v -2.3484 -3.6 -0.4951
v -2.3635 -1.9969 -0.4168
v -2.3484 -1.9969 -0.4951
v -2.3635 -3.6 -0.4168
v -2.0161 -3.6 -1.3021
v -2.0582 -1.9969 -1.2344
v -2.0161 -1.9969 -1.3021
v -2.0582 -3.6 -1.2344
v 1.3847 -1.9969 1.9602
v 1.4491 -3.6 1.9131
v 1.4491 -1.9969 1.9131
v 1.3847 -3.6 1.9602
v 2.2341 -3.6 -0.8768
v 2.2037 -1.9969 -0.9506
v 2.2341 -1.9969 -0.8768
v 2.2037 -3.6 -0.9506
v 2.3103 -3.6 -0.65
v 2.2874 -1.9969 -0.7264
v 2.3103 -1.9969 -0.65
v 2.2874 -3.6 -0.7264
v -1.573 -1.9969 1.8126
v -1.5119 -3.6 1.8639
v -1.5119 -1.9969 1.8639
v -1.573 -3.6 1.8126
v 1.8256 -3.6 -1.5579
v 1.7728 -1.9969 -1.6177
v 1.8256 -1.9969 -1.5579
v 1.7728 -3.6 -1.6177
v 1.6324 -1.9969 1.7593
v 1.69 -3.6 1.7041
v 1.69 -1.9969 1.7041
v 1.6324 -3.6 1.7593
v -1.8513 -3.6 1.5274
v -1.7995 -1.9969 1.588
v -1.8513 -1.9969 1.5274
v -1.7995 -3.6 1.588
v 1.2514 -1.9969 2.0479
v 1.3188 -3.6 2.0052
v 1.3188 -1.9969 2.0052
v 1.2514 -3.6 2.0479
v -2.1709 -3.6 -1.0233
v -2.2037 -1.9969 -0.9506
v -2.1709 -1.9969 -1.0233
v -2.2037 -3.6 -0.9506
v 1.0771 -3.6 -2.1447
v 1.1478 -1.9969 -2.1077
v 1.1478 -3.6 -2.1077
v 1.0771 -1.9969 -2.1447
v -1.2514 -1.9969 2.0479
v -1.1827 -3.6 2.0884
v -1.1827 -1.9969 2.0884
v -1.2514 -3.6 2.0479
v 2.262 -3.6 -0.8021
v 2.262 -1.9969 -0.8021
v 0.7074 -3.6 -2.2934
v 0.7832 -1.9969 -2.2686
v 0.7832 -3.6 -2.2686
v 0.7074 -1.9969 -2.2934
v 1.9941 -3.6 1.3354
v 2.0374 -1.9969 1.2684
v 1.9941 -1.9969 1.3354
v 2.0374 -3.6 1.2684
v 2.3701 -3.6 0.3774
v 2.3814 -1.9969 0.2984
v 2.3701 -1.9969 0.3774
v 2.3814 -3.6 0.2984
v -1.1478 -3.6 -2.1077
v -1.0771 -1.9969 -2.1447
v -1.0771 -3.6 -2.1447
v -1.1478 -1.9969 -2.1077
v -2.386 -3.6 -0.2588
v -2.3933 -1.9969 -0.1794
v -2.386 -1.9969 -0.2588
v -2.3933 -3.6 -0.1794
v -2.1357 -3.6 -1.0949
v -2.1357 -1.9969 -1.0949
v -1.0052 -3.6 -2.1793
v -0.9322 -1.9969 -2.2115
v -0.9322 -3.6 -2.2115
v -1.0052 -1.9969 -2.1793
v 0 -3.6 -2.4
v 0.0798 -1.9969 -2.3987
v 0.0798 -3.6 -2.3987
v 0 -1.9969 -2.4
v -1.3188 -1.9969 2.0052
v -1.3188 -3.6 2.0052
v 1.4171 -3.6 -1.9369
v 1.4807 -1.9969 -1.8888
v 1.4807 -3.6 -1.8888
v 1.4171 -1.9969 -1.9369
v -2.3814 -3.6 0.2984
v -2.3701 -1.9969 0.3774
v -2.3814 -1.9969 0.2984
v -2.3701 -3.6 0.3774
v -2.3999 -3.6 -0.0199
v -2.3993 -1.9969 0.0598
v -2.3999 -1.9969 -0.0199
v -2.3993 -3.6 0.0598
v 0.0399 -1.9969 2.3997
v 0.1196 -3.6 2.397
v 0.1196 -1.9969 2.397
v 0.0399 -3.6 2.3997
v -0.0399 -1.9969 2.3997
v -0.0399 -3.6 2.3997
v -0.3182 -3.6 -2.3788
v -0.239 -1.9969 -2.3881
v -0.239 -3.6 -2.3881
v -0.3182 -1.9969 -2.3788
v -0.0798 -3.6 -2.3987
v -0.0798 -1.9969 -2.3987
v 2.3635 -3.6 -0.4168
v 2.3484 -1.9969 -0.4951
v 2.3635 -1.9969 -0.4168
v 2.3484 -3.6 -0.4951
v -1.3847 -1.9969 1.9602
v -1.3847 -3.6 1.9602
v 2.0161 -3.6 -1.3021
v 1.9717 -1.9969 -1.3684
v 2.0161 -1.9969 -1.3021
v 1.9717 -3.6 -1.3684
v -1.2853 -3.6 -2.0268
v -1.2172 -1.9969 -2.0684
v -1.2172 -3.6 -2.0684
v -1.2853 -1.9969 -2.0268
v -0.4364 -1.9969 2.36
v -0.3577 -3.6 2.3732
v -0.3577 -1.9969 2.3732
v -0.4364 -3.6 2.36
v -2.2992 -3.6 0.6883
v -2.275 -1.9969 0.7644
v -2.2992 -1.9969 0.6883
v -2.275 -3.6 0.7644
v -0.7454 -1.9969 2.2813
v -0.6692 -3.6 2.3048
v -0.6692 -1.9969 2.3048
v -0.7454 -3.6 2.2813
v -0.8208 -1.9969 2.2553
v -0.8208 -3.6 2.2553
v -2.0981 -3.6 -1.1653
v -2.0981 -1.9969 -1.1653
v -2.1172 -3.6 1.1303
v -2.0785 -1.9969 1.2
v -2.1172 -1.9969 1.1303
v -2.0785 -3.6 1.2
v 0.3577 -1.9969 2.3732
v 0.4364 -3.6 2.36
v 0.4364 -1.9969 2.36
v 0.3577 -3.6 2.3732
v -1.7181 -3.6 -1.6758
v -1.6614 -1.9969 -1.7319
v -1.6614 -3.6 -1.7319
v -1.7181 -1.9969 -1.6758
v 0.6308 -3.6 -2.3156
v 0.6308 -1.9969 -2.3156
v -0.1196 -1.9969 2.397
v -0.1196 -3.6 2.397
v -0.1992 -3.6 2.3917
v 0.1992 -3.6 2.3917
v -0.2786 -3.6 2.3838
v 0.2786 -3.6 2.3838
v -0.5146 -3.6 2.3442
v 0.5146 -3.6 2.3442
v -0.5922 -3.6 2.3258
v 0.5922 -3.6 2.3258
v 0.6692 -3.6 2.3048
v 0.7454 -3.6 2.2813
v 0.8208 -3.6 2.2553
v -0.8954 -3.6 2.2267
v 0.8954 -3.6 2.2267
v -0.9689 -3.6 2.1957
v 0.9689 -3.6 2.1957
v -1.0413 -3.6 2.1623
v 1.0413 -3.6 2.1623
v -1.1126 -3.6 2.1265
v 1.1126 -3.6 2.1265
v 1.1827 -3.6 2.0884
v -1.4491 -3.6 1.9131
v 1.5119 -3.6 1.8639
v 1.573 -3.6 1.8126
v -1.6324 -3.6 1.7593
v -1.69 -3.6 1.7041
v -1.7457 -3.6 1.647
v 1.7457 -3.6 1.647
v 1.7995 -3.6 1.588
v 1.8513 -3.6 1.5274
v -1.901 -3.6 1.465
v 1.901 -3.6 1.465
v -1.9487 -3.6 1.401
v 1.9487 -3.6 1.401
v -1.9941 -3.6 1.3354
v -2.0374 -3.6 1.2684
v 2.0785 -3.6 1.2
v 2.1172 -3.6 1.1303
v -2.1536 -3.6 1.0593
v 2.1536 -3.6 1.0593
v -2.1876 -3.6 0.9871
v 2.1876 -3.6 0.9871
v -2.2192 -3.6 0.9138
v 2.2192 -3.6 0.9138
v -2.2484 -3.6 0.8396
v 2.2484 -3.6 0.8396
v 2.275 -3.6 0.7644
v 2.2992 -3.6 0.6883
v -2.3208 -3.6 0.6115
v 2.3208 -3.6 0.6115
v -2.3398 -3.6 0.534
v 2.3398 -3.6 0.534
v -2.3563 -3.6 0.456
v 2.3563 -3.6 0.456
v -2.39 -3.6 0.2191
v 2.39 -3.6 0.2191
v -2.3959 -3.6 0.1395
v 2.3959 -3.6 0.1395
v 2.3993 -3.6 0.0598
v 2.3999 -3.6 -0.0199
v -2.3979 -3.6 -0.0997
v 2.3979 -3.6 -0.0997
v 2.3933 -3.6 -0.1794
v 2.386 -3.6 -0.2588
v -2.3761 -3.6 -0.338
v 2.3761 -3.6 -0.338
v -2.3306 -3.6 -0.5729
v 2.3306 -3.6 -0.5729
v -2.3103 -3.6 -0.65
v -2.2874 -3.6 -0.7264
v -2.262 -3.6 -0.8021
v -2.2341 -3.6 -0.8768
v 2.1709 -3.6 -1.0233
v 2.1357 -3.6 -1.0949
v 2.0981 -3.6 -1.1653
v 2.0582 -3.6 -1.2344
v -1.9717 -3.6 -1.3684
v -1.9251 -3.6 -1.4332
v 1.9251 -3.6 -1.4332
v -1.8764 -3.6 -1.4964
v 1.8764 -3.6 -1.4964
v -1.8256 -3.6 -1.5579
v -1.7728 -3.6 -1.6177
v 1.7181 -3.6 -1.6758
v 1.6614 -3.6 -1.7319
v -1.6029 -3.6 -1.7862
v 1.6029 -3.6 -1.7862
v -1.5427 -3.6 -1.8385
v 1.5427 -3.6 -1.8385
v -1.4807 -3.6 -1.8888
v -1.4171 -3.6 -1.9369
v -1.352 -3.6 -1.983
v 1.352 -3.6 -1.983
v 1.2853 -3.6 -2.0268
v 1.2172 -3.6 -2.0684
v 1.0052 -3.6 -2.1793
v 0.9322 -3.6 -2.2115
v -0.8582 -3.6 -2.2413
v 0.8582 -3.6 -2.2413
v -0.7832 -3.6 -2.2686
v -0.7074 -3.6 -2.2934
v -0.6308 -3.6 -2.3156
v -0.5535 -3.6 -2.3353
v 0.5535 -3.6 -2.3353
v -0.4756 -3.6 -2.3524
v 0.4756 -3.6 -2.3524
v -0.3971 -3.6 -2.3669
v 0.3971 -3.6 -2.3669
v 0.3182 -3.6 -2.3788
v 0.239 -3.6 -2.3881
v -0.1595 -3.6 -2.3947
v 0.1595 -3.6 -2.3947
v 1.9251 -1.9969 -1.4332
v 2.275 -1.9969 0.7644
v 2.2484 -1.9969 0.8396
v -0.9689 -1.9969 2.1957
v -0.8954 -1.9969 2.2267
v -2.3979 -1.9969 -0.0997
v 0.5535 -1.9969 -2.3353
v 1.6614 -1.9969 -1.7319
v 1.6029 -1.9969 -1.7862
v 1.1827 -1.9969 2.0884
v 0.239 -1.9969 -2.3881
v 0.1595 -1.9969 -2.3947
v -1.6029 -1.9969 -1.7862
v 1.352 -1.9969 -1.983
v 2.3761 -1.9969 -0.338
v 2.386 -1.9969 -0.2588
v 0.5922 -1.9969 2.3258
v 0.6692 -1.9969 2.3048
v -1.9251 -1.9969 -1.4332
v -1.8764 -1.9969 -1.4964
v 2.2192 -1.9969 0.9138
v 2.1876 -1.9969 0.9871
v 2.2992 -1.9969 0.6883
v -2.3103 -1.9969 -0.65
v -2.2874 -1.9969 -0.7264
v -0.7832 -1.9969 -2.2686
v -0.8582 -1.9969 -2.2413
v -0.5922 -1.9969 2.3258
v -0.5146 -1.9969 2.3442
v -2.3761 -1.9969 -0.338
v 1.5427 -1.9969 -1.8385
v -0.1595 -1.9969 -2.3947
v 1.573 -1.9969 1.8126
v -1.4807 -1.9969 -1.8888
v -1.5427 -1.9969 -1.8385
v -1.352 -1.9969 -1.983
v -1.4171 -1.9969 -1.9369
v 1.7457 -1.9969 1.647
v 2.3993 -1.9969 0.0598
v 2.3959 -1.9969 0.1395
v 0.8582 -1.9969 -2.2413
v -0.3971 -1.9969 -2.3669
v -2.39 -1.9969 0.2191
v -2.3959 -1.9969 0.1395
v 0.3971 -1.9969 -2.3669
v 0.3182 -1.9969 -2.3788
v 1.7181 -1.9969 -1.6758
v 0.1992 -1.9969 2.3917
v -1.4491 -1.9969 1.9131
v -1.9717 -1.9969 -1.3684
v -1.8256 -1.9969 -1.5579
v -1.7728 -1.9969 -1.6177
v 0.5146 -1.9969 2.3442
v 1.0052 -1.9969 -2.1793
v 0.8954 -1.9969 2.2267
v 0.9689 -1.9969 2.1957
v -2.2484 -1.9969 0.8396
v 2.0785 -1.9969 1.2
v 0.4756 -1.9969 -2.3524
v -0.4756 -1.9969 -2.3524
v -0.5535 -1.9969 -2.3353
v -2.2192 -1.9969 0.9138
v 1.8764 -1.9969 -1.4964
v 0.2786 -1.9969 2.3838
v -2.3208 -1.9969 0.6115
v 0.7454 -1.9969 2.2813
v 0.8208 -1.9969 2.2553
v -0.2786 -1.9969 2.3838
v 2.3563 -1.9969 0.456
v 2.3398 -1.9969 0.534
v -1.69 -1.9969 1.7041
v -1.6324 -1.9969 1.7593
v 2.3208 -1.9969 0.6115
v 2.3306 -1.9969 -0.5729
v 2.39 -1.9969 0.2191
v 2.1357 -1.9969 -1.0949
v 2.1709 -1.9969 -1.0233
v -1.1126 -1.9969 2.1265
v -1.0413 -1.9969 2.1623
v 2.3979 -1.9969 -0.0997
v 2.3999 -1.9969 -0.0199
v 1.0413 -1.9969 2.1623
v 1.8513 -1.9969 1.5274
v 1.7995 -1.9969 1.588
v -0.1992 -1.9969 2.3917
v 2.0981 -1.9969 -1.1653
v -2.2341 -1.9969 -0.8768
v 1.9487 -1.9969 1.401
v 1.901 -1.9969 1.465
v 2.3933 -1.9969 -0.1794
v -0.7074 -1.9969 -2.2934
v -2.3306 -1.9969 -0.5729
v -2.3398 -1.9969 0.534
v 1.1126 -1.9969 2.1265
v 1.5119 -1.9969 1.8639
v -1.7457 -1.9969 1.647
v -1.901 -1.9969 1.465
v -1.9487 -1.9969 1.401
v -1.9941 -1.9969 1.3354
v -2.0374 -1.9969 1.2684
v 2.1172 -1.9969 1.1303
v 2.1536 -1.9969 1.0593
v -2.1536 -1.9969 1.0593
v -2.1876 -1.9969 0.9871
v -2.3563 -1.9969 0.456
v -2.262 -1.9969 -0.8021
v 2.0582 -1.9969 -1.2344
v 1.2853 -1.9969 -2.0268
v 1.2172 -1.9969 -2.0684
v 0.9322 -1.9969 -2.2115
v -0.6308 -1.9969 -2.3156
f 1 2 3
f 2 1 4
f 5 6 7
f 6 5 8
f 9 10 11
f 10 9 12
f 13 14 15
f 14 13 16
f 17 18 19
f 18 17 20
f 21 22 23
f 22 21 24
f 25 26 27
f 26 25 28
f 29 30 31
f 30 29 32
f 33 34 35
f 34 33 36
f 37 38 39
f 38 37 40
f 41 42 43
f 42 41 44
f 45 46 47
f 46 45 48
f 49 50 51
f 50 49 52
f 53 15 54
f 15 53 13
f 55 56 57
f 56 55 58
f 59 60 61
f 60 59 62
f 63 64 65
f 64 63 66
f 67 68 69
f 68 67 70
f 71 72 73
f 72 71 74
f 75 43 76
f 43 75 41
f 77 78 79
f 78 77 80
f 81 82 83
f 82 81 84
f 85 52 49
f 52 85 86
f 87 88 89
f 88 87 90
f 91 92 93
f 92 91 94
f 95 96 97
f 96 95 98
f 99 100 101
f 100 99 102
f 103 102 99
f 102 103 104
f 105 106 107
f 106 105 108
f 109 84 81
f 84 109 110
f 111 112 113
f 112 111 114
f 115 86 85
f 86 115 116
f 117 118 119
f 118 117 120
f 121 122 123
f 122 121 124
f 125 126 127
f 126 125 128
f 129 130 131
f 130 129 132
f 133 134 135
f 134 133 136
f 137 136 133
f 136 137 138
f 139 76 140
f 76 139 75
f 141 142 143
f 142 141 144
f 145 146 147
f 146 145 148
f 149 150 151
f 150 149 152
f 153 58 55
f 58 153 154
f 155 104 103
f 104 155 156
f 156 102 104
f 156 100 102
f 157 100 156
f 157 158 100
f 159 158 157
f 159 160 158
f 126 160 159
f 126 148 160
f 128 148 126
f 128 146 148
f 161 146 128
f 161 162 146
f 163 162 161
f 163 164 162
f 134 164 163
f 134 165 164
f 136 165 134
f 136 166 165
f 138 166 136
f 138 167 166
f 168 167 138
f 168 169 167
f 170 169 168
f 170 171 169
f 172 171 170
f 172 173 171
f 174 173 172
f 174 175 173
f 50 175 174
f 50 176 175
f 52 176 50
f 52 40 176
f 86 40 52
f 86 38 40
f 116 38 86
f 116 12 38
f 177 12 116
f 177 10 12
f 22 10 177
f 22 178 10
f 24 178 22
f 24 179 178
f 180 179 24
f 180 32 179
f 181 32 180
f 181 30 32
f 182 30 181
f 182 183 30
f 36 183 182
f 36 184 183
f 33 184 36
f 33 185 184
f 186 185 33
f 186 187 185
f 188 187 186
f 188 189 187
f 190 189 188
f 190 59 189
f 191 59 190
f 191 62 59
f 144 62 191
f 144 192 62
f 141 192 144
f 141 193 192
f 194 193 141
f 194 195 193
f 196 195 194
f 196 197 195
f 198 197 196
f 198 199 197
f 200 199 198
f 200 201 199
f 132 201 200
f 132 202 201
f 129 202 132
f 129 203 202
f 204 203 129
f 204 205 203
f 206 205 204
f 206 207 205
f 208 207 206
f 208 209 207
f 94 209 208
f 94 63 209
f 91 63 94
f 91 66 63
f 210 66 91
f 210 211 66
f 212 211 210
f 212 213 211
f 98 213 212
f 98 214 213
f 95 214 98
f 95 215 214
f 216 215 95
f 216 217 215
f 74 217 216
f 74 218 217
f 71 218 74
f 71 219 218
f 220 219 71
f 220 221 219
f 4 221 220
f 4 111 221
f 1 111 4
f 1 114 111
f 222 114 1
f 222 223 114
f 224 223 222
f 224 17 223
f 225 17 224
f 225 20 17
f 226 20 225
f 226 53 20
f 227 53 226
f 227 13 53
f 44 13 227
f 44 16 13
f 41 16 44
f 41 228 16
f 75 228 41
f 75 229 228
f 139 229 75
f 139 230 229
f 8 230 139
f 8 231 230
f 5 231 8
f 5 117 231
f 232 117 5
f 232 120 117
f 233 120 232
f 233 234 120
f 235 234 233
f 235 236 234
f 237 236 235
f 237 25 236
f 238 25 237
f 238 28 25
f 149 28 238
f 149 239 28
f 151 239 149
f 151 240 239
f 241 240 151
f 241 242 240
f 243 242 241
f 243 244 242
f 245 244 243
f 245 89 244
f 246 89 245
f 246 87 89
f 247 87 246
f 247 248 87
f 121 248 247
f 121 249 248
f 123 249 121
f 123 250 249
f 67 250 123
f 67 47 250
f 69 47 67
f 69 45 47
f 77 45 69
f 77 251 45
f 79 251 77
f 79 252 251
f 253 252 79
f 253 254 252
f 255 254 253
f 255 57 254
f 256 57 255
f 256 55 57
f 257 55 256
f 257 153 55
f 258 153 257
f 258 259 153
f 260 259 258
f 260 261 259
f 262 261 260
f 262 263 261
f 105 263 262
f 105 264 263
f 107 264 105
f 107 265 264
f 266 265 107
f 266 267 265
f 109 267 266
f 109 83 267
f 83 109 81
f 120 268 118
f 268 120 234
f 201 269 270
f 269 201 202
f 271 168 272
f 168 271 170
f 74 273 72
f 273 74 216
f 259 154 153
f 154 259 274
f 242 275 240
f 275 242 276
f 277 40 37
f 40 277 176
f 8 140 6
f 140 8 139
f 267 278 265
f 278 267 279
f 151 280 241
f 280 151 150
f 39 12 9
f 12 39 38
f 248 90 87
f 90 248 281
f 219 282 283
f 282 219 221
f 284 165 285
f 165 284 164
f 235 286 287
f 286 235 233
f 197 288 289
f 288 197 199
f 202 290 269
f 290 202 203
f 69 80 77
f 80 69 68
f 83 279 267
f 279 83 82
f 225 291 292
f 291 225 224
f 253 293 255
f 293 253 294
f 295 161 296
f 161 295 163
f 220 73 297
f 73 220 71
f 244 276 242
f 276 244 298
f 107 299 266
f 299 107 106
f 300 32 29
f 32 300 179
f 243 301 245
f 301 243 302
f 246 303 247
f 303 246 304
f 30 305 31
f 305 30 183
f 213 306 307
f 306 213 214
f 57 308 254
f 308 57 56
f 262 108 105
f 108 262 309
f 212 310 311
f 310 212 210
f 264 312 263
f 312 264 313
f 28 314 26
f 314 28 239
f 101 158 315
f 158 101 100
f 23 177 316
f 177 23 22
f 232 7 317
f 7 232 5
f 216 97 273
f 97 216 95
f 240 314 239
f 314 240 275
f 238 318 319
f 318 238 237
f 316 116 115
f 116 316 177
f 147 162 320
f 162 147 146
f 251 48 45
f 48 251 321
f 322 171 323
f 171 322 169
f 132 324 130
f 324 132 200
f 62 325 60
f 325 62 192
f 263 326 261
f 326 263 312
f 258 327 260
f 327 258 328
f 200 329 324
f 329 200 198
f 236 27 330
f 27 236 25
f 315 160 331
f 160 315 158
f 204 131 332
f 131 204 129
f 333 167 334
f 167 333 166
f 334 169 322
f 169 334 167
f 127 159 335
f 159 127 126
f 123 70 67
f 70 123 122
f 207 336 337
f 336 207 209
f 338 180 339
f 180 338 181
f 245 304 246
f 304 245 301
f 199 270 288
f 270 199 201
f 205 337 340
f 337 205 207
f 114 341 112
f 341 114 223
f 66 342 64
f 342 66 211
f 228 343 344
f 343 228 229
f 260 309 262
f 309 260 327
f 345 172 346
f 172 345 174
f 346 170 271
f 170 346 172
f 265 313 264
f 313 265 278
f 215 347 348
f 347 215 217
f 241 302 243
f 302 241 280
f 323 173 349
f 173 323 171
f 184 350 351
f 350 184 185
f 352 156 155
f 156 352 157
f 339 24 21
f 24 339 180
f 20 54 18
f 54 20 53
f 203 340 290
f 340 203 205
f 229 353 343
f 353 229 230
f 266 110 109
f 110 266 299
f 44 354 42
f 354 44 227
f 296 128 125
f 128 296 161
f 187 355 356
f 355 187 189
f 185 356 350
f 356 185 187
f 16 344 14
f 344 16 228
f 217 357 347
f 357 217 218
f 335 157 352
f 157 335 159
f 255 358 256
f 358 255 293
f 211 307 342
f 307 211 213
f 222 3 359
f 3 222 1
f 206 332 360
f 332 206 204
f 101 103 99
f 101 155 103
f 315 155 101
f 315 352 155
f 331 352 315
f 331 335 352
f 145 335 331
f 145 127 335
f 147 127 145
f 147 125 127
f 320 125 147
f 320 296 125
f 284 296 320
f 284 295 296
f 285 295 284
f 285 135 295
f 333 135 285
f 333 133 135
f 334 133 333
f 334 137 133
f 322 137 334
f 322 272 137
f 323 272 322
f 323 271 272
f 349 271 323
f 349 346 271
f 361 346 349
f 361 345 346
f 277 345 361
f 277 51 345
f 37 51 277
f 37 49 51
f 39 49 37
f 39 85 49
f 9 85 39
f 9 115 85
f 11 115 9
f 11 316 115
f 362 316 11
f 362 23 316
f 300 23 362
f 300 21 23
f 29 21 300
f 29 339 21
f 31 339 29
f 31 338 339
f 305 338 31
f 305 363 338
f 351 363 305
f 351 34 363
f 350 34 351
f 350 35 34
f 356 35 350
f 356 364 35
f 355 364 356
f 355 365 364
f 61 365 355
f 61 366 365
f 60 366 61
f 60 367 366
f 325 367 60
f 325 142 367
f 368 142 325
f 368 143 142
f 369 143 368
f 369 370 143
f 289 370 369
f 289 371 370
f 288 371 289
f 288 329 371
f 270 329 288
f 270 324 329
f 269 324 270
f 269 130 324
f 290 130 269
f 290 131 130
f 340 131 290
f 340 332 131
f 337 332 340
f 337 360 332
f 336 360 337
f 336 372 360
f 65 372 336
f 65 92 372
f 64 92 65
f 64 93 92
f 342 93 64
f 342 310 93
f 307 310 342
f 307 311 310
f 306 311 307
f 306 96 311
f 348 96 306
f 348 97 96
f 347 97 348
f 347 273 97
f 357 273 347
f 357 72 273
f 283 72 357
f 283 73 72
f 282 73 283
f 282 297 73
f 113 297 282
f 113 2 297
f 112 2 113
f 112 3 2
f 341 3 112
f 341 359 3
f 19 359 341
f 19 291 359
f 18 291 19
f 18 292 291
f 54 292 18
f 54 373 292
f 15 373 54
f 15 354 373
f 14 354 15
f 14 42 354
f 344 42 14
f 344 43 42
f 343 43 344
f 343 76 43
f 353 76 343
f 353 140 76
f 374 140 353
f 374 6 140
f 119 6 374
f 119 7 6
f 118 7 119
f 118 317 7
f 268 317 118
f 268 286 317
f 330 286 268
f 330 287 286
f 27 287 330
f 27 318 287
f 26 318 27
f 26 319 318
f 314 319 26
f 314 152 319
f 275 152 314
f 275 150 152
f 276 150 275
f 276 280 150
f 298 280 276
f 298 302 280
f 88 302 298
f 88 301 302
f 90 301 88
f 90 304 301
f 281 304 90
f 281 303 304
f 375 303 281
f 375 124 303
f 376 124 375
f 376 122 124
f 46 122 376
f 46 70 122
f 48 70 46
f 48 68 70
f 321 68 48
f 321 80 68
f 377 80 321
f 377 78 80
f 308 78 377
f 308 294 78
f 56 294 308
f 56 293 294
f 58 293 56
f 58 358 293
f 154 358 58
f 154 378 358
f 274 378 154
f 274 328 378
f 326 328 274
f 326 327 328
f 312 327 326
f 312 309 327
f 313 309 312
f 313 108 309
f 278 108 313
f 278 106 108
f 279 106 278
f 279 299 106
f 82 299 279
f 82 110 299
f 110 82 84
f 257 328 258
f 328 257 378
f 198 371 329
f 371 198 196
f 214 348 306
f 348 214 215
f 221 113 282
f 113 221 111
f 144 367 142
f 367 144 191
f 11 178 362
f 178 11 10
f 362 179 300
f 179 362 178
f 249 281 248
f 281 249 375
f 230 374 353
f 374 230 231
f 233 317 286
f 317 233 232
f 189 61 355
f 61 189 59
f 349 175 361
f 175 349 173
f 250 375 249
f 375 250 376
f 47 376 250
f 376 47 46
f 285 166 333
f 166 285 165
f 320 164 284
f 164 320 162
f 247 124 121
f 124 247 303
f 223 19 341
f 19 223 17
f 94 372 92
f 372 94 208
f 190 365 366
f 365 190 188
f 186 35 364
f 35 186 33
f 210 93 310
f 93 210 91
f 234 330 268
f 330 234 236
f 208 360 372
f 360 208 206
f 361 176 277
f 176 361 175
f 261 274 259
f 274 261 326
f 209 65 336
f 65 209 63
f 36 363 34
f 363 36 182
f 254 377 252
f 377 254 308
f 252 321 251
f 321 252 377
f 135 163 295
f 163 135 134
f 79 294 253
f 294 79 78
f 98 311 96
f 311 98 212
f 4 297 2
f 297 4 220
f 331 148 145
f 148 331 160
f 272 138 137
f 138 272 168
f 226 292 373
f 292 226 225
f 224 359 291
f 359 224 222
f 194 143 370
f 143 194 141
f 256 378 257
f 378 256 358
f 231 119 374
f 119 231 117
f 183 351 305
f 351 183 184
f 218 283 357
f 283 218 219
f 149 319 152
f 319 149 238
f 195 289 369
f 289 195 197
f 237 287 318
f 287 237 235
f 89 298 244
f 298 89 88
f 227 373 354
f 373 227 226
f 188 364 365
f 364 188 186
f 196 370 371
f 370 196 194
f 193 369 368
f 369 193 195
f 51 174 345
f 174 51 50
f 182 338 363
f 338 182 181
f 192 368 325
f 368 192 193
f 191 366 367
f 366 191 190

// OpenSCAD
use <../lib.scad>
use <../p/4-4con3.scad>
use <../p/4-4con4.scad>
use <../p/4-4cyli.scad>
use <../p/4-4disc.scad>
use <../p/4-4edge.scad>
use <../p/4-4ring1.scad>
use <../p/4-4ring2.scad>
use <../p/4-4ring3.scad>
use <../p/4-4ring4.scad>
use <../p/stud.scad>
$fa=1; $fs=0.2;
function ldraw_lib__20(realsolid=false) = [
// 0 ~Wheel Centre Small for Steel Axle
// 0 Name: 20.dat
// 0 Author: James Jessiman
// 0 !LDRAW_ORG Part UPDATE 2010-02
// 0 !LICENSE Licensed under CC BY 2.0 and CC BY 4.0 : see CAreadme.txt
// 
// 0 BFC CERTIFY CCW
  [0,"BFC","CERTIFY"],
  [0,"BFC","CCW"],
// 
// 0 !HISTORY 1999-05-17 [PTadmin] Official Update 1999-03
// 0 !HISTORY 2003-09-04 [mkennedy] optimized with cones, BFC
// 0 !HISTORY 2003-12-19 [PTadmin] Official Update 2003-03
// 0 !HISTORY 2004-01-14 [Steffen] un-mirrored stud logo, removed L3P warnings
// 0 !HISTORY 2004-04-22 [PTadmin] Official Update 2004-02
// 0 !HISTORY 2007-05-08 [PTadmin] Header formatted for Contributor Agreement
// 0 !HISTORY 2008-07-01 [PTadmin] Official Update 2008-01
// 0 !HISTORY 2008-07-07 [nielsk] fixed stud size (2004-06-06)
// 0 !HISTORY 2008-07-08 [nielsk] axlehole added (2004-12-08)
// 0 !HISTORY 2010-07-05 [PTadmin] Official Update 2010-02
// 
// 
// 1 16 0 0 -5 0 0 10 10 0 0 0 1 0 4-4edge.dat
  [1,16,0,0,-5,0,0,10,10,0,0,0,1,0, ldraw_lib__4_4edge(realsolid)],
// 1 16 0 0 -4 0 0 10 10 0 0 0 1 0 4-4edge.dat
  [1,16,0,0,-4,0,0,10,10,0,0,0,1,0, ldraw_lib__4_4edge(realsolid)],
// 1 16 0 0 -2 0 0 6 6 0 0 0 1 0 4-4edge.dat
  [1,16,0,0,-2,0,0,6,6,0,0,0,1,0, ldraw_lib__4_4edge(realsolid)],
// 1 16 0 0 2 0 0 6 6 0 0 0 1 0 4-4edge.dat
  [1,16,0,0,2,0,0,6,6,0,0,0,1,0, ldraw_lib__4_4edge(realsolid)],
// 1 16 0 0 4 0 0 10 10 0 0 0 1 0 4-4edge.dat
  [1,16,0,0,4,0,0,10,10,0,0,0,1,0, ldraw_lib__4_4edge(realsolid)],
// 1 16 0 0 5 0 0 10 10 0 0 0 1 0 4-4edge.dat
  [1,16,0,0,5,0,0,10,10,0,0,0,1,0, ldraw_lib__4_4edge(realsolid)],
// 1 16 0 0 8 0 0 6 6 0 0 0 1 0 4-4edge.dat
  [1,16,0,0,8,0,0,6,6,0,0,0,1,0, ldraw_lib__4_4edge(realsolid)],
// 1 16 0 0 8 0 0 2 2 0 0 0 1 0 4-4edge.dat
  [1,16,0,0,8,0,0,2,2,0,0,0,1,0, ldraw_lib__4_4edge(realsolid)],
// 1 16 0 0 -5 0 0 2 2 0 0 0 1 0 4-4edge.dat
  [1,16,0,0,-5,0,0,2,2,0,0,0,1,0, ldraw_lib__4_4edge(realsolid)],
// 1 16 0 0 -5 0 0 2 2 0 0 0 1 0 4-4ring3.dat
  [1,16,0,0,-5,0,0,2,2,0,0,0,1,0, ldraw_lib__4_4ring3(realsolid)],
// 1 16 0 0 -5 0 0 2 2 0 0 0 1 0 4-4ring4.dat
  [1,16,0,0,-5,0,0,2,2,0,0,0,1,0, ldraw_lib__4_4ring4(realsolid)],
// 1 16 0 0 8 0 0 2 2 0 0 0 -1 0 4-4ring1.dat
  [1,16,0,0,8,0,0,2,2,0,0,0,-1,0, ldraw_lib__4_4ring1(realsolid)],
// 1 16 0 0 8 0 0 2 2 0 0 0 -1 0 4-4ring2.dat
  [1,16,0,0,8,0,0,2,2,0,0,0,-1,0, ldraw_lib__4_4ring2(realsolid)],
// 1 16 0 0 -5 0 0 2 2 0 0 0 -1 0 4-4disc.dat
  [1,16,0,0,-5,0,0,2,2,0,0,0,-1,0, ldraw_lib__4_4disc(realsolid)],
// 0 BFC INVERTNEXT
  [0,"BFC","INVERTNEXT"],
// 1 16 0 0 8 0 0 2 2 0 0 0 -13 0 4-4cyli.dat
  [1,16,0,0,8,0,0,2,2,0,0,0,-13,0, ldraw_lib__4_4cyli(realsolid)],
// 1 16 0 0 -5 0 0 10 10 0 0 0 1 0 4-4cyli.dat
  [1,16,0,0,-5,0,0,10,10,0,0,0,1,0, ldraw_lib__4_4cyli(realsolid)],
// 1 16 0 0 -2 0 0 6 6 0 0 0 4 0 4-4cyli.dat
  [1,16,0,0,-2,0,0,6,6,0,0,0,4,0, ldraw_lib__4_4cyli(realsolid)],
// 1 16 0 0 5 0 0 10 10 0 0 0 -1 0 4-4cyli.dat
  [1,16,0,0,5,0,0,10,10,0,0,0,-1,0, ldraw_lib__4_4cyli(realsolid)],
// 1 16 0 0 -4 2 0 0 0 0 2 0 1 0 4-4con4.dat
  [1,16,0,0,-4,2,0,0,0,0,2,0,1,0, ldraw_lib__4_4con4(realsolid)],
// 1 16 0 0 -3 2 0 0 0 0 2 0 1 0 4-4con3.dat
  [1,16,0,0,-3,2,0,0,0,0,2,0,1,0, ldraw_lib__4_4con3(realsolid)],
// 1 16 0 0 4 2 0 0 0 0 2 0 -1 0 4-4con4.dat
  [1,16,0,0,4,2,0,0,0,0,2,0,-1,0, ldraw_lib__4_4con4(realsolid)],
// 1 16 0 0 3 2 0 0 0 0 2 0 -1 0 4-4con3.dat
  [1,16,0,0,3,2,0,0,0,0,2,0,-1,0, ldraw_lib__4_4con3(realsolid)],
// 1 16 0 0 5 2 0 0 0 0 2 0 1.5 0 4-4con4.dat
  [1,16,0,0,5,2,0,0,0,0,2,0,1.5,0, ldraw_lib__4_4con4(realsolid)],
// 1 16 0 0 6.5 2 0 0 0 0 2 0 1.5 0 4-4con3.dat
  [1,16,0,0,6.5,2,0,0,0,0,2,0,1.5,0, ldraw_lib__4_4con3(realsolid)],
// 1 16 0 0 -5 1 0 0 0 0 -1 0 1 0 stud.dat
  [1,16,0,0,-5,1,0,0,0,0,-1,0,1,0, ldraw_lib__stud(realsolid)],
// 0
];
module ldraw_lib__20(step=0, col=false, unit=2/5, alt=false, line=0.2, solid=!$preview)
    makepoly(ldraw_lib__20(solid), step=step, col=col, unit=unit, alt=alt, line=line, solid=solid);
ldraw_lib__20(line=0.2);
